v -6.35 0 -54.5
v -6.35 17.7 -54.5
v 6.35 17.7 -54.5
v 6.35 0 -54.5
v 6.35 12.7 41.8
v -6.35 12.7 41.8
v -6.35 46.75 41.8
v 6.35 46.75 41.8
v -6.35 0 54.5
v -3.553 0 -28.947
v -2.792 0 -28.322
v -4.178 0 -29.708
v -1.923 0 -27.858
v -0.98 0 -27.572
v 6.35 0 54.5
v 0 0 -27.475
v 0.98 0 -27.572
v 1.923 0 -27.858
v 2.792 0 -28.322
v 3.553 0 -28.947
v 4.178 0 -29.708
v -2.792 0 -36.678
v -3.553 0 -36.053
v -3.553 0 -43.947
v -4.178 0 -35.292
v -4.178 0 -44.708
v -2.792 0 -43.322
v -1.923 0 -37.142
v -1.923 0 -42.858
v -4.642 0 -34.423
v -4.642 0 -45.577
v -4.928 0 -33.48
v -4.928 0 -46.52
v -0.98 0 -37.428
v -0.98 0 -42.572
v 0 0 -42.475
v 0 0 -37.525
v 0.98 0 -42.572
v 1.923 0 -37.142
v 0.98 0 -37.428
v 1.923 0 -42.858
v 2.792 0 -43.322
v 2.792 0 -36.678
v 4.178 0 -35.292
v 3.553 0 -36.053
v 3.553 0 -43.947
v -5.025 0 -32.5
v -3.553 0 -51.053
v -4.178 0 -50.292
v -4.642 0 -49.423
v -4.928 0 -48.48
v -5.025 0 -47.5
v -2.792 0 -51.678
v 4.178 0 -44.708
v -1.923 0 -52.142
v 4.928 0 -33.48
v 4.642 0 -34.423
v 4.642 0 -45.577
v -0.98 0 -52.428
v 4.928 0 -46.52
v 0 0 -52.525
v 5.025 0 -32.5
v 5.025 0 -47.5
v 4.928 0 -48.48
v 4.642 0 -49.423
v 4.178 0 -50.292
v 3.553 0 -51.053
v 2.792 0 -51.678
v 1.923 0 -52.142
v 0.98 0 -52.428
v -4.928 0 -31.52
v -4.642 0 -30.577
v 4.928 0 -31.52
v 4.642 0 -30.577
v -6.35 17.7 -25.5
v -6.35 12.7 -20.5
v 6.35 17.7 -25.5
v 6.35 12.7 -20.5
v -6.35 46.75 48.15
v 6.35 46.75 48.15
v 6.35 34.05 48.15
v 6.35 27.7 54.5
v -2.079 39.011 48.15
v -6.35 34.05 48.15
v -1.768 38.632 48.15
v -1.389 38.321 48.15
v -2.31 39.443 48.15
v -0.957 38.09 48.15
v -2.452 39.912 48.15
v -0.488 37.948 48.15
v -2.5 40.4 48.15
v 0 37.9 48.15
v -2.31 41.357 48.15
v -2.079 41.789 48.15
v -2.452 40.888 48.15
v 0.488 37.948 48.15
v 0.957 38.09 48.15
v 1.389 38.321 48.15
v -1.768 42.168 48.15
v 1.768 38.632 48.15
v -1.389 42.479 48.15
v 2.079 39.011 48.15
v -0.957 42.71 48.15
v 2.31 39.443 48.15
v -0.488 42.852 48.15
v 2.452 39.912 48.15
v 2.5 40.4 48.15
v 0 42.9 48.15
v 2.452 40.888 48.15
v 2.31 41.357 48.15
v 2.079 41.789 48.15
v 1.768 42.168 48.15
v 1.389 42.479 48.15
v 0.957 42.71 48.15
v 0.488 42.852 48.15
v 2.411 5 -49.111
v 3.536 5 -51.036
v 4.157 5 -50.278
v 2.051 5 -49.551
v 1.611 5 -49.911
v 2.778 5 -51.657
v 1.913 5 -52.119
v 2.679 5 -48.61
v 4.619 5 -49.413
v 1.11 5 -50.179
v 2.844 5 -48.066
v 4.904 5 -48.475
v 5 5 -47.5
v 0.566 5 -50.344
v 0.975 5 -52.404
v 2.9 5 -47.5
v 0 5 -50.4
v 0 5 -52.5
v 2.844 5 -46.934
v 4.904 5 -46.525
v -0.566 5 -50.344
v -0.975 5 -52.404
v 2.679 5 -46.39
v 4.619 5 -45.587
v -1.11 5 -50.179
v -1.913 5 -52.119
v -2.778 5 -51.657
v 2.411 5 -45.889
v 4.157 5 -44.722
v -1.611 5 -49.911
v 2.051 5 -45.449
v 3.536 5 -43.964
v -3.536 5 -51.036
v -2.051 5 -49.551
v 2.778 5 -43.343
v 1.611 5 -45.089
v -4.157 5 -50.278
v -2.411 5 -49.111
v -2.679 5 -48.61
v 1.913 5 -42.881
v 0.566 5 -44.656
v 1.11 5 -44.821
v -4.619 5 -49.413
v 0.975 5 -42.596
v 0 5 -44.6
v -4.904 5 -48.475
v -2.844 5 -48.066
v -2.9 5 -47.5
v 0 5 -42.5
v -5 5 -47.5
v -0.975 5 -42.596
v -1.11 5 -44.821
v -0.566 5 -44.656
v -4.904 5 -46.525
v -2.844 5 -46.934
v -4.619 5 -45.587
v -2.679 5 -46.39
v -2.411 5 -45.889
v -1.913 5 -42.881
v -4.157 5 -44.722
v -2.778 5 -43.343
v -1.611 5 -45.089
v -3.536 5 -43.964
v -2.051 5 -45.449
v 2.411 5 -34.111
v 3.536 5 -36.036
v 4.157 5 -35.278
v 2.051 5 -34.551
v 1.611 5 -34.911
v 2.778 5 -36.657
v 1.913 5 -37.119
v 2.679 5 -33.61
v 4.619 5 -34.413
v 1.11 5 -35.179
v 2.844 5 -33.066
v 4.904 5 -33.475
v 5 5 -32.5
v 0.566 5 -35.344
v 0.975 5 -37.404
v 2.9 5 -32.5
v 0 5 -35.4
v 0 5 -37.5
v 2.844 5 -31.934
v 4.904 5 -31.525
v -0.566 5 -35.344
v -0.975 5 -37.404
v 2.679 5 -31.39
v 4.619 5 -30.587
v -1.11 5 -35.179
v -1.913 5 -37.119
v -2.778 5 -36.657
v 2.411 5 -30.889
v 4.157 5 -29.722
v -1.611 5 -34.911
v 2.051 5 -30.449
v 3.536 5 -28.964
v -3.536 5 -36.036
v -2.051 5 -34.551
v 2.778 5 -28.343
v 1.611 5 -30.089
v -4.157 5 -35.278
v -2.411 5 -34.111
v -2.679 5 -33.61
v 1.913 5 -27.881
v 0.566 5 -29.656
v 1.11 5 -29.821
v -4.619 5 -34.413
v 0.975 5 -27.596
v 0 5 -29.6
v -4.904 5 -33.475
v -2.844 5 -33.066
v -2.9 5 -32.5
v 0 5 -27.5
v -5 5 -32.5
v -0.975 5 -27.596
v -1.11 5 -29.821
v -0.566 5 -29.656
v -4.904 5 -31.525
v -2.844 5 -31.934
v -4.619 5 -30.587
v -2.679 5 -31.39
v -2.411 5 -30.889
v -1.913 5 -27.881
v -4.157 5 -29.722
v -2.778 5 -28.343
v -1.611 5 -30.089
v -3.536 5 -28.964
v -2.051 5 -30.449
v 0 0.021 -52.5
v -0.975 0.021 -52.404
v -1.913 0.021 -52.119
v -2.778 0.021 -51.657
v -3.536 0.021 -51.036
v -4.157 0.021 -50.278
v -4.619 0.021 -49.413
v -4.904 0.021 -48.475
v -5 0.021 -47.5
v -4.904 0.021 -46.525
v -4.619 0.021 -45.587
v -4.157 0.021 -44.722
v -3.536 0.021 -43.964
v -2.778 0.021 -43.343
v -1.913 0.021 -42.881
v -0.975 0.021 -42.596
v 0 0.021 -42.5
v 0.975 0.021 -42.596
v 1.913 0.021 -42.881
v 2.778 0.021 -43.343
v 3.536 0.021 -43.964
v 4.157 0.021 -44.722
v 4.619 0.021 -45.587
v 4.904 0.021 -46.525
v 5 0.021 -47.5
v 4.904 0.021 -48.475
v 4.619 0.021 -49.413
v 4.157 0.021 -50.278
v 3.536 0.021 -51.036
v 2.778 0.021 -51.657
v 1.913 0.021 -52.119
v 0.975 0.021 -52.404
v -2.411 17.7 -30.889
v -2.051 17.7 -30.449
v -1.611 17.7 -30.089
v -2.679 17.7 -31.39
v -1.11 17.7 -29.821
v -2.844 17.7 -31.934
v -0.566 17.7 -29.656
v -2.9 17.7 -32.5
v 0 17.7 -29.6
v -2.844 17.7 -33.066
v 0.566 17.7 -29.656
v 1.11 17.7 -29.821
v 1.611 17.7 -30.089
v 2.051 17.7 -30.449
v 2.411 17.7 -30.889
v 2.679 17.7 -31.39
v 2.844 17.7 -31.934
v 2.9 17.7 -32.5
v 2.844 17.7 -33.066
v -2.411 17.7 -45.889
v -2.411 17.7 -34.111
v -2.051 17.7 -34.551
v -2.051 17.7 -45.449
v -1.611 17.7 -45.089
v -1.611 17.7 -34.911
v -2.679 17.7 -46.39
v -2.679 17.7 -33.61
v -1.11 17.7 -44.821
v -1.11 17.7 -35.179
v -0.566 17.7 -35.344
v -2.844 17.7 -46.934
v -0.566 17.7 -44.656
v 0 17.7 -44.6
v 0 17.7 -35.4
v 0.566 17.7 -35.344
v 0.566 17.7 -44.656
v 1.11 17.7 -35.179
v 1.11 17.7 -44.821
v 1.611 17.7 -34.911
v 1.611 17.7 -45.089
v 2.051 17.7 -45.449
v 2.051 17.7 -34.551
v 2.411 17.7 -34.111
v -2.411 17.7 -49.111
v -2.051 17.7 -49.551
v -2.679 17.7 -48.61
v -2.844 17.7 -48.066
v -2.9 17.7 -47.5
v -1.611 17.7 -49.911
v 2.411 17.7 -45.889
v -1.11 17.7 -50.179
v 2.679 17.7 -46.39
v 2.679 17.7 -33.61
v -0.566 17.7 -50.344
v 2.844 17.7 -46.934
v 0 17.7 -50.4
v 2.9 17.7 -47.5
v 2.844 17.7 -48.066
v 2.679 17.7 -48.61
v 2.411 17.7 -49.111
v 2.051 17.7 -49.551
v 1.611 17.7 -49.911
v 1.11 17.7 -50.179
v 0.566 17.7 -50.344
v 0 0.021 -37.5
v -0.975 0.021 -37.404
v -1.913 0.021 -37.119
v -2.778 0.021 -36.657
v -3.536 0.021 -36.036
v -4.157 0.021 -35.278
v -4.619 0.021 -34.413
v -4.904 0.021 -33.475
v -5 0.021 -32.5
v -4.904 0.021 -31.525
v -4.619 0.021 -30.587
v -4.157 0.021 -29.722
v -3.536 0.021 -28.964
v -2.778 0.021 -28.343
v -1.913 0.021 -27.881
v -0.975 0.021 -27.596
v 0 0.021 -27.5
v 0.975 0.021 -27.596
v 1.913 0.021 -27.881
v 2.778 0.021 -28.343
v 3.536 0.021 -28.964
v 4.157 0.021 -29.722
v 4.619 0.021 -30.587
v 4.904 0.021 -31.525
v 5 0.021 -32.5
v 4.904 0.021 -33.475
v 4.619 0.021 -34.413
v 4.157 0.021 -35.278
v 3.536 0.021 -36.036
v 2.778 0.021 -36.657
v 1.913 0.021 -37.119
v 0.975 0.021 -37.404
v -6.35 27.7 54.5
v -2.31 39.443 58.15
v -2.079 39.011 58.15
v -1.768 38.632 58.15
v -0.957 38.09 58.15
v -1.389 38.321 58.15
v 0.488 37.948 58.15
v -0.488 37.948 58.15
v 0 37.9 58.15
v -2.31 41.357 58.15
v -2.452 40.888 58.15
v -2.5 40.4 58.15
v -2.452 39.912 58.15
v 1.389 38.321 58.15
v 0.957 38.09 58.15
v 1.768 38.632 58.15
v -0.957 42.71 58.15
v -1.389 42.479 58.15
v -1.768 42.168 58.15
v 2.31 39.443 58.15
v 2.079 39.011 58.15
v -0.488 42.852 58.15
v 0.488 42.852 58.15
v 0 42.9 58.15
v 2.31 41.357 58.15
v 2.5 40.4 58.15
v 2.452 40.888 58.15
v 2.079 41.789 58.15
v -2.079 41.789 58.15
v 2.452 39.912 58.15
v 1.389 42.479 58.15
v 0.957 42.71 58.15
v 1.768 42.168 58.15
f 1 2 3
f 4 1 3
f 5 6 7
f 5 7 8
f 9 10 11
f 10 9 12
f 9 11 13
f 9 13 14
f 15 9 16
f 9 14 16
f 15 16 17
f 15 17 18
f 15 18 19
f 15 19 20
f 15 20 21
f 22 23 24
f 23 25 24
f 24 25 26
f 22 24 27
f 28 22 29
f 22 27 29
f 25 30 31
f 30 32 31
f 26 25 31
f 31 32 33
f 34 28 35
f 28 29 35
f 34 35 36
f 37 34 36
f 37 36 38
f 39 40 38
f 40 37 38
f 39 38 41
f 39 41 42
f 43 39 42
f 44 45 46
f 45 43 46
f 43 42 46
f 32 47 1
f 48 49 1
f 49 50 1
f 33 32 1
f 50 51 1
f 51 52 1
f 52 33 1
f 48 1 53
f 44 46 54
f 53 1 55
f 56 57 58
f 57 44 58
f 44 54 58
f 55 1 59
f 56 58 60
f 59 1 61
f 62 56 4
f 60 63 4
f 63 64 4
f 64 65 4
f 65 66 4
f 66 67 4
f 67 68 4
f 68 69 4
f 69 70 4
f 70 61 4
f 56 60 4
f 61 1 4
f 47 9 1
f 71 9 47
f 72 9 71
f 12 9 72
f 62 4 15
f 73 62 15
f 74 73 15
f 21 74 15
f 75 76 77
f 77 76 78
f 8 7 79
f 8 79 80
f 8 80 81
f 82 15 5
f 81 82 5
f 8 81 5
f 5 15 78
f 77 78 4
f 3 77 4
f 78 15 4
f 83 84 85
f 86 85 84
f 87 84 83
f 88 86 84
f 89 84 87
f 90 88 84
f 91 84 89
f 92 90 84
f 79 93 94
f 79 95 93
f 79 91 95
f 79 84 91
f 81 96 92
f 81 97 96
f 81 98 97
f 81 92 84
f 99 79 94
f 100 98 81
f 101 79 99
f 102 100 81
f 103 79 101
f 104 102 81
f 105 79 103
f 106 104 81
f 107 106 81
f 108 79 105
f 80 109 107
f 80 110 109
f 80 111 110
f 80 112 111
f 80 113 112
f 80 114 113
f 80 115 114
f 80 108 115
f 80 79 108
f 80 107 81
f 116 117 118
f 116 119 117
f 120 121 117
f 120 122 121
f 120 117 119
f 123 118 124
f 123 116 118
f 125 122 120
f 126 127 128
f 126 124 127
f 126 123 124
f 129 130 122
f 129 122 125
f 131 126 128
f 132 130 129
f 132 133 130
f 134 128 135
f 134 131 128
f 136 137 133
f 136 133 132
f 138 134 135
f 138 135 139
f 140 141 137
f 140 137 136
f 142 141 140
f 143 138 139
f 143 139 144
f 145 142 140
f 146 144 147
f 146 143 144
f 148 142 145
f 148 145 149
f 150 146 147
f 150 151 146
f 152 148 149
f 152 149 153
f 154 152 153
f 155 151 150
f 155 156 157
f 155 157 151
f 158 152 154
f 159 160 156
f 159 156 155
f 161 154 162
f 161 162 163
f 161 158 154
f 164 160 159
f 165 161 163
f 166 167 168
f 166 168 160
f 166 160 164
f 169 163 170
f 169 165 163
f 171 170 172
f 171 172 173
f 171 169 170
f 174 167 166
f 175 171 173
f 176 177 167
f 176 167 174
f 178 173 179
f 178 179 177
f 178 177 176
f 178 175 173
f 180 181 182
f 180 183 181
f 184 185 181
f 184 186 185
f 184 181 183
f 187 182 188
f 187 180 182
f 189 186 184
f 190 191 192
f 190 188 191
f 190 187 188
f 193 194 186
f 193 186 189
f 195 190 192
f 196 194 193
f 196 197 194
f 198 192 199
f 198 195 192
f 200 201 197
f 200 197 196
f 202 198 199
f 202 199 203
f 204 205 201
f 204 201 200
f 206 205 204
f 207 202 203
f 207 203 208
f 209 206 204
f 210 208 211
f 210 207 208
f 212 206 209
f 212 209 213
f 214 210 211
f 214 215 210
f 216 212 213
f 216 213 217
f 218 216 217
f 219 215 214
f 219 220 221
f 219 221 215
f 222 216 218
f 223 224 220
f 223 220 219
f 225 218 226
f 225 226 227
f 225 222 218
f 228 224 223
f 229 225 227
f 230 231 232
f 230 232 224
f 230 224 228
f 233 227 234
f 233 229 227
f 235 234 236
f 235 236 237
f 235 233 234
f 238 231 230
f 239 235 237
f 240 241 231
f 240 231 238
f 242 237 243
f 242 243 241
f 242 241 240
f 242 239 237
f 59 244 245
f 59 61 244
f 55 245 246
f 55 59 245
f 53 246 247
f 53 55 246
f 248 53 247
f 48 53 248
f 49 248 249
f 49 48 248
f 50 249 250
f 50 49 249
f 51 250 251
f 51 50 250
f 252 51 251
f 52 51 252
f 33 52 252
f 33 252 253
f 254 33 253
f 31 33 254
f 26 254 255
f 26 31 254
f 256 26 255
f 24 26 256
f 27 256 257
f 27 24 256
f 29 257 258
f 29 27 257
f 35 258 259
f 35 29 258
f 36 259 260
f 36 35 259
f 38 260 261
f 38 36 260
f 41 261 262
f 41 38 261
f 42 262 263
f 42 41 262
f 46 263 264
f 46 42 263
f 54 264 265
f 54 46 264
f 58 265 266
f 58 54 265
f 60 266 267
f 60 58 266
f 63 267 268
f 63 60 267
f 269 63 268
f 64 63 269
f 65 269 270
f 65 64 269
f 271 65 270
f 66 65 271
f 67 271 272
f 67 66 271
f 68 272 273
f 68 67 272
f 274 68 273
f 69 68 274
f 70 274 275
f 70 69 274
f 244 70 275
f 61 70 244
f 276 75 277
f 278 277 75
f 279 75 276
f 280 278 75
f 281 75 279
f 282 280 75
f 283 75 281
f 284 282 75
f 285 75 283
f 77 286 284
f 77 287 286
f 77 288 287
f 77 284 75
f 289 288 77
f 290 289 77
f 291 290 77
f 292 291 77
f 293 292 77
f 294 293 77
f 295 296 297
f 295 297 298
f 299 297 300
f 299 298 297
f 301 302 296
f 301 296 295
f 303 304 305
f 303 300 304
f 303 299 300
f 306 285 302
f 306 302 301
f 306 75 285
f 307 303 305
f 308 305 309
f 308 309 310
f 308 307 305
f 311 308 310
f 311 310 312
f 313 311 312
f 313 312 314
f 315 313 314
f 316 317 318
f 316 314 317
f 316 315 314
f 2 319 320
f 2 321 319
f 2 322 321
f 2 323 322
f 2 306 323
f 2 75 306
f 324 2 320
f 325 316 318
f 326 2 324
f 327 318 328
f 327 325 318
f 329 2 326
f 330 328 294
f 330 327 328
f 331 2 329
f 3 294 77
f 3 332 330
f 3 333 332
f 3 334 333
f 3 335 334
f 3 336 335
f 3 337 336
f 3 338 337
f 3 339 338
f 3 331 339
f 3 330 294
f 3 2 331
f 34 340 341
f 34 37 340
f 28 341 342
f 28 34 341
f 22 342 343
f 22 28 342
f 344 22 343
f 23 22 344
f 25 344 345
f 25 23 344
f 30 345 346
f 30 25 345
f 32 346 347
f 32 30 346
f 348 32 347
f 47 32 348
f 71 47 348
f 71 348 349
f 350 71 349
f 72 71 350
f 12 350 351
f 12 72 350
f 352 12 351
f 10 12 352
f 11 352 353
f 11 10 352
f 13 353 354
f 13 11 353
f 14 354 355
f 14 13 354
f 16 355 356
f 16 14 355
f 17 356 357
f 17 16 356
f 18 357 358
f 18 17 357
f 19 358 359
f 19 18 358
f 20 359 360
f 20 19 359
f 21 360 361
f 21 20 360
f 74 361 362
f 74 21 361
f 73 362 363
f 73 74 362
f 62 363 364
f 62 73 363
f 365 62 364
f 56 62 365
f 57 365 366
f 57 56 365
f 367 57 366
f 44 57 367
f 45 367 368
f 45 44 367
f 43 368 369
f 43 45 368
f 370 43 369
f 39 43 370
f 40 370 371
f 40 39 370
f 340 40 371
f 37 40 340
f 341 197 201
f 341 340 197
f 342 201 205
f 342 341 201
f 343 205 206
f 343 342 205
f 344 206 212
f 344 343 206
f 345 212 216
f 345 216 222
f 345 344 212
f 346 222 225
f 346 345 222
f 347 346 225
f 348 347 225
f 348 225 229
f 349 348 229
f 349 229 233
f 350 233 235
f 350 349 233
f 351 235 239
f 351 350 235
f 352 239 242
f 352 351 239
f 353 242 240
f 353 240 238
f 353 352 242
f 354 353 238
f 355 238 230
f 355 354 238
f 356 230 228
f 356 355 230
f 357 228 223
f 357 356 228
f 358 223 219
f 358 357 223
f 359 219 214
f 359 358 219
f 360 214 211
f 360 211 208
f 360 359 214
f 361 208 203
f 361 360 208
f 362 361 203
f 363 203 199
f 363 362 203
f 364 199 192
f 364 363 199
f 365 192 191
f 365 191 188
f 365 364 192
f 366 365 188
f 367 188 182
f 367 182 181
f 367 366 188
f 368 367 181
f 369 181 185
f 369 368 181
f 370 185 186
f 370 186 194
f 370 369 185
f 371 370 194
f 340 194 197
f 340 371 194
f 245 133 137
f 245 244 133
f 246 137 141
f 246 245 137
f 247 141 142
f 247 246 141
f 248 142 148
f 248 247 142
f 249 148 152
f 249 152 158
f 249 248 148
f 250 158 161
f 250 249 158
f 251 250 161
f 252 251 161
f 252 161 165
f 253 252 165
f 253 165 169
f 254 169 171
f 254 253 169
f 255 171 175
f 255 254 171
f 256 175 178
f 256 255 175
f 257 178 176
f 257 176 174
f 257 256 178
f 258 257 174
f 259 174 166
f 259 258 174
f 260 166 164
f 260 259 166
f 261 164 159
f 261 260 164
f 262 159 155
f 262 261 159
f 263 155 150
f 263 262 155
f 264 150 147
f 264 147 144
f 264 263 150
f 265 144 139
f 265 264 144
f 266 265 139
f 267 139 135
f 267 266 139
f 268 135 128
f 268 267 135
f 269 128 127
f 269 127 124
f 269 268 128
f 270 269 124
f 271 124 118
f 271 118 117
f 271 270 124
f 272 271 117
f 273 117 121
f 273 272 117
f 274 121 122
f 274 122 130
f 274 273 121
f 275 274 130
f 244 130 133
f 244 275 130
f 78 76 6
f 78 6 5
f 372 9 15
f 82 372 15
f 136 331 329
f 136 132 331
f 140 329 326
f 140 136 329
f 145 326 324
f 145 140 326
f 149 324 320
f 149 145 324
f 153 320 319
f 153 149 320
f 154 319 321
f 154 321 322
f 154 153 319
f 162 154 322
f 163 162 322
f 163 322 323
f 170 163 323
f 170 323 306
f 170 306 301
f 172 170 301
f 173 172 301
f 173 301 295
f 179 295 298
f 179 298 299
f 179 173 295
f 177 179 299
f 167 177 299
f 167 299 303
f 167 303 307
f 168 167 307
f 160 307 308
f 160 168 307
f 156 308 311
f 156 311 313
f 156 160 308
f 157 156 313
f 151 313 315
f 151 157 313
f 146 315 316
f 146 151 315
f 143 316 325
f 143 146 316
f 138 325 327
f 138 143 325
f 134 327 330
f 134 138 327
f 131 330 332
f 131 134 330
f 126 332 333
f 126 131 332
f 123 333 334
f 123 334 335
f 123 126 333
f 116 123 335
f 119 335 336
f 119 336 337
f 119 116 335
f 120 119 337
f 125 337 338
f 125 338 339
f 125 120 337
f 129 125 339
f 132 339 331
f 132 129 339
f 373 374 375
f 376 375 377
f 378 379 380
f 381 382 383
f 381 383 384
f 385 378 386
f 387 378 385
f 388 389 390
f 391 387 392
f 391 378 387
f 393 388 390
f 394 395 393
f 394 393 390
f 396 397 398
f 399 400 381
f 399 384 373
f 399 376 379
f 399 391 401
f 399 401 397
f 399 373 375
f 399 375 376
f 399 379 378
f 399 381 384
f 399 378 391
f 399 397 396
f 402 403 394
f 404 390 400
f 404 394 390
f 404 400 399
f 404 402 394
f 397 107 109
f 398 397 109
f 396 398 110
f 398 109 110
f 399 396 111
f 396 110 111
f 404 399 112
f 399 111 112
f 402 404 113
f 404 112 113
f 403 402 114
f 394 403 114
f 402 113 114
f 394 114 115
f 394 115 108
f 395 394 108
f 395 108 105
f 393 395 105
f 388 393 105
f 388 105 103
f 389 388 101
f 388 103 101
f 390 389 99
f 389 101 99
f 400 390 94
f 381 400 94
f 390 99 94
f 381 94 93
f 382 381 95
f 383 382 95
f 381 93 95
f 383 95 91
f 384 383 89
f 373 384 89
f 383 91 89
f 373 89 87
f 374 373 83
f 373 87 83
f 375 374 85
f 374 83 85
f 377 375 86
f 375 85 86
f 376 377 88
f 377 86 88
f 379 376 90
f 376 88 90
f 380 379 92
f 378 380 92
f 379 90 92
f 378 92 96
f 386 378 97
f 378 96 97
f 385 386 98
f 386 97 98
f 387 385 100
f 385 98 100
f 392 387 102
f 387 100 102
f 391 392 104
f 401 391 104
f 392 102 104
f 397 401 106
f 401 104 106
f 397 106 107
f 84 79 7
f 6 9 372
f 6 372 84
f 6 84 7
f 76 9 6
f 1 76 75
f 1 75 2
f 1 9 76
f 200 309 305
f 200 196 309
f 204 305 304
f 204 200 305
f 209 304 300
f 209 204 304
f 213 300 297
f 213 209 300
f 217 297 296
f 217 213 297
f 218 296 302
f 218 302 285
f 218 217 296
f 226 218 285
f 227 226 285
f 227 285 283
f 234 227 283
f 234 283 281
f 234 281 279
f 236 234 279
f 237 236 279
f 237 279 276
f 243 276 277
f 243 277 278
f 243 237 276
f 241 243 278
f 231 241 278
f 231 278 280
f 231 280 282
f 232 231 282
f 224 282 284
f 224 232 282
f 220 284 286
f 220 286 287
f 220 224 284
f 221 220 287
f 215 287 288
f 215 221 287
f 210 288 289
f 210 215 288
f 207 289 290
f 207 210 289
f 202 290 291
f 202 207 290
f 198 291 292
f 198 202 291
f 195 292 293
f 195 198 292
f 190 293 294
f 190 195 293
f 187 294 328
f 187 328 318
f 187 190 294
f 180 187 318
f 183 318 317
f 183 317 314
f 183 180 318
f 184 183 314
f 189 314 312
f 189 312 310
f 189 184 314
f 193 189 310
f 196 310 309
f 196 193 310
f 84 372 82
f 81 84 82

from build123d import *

# Parameters (mm, degrees)
SKETCH2_W                     = 12.7
SKETCH2_H                     = 109
BOSS_EXTRUDE1_DEPTH           = 12.7
SKETCH5_W                     = 12.7
SKETCH5_H                     = 29
BOSS_EXTRUDE2_DEPTH           = 5
CBORE_FOR_M5_SHCS1_AT_2_COUNT = 2
CBORE_FOR_M5_SHCS1_AT_2_PITCH = 15
CHAMFER1_SIZE                 = 5
SKETCH7_W                     = 12.7
SKETCH7_H                     = 12.7
BOSS_EXTRUDE4_DEPTH           = 34.05
SKETCH9_W                     = 12.7
SKETCH9_H                     = 12.7
CUT_EXTRUDE2_DEPTH            = 6.35
SKETCH6_R                     = 2.5
BOSS_EXTRUDE7_DEPTH           = 10
CHAMFER3_SIZE                 = 6.35


with BuildPart() as part:
    # Sketch2 → Boss-Extrude1 (new body)
    with BuildSketch(Plane(origin=(0, 0, 0), x_dir=(1, 0, 0), z_dir=(0, 1, 0))):
        Rectangle(SKETCH2_W, SKETCH2_H)
    extrude(amount=BOSS_EXTRUDE1_DEPTH)

    # Sketch5 → Boss-Extrude2 (add)
    with BuildSketch(Plane(origin=(0, 12.7, 0), x_dir=(1, 0, 0), z_dir=(0, 1, 0))):
        with Locations((0, 40)):
            Rectangle(SKETCH5_W, SKETCH5_H)
    extrude(amount=BOSS_EXTRUDE2_DEPTH)

    # Sketch4 → CBORE for M5 SHCS1 (revolve, cut)
    with BuildSketch(Plane(origin=(0, 0, -47.5), x_dir=(0, 0, -1), z_dir=(1, 0, 0))):
        Polygon((0, 0), (0, 17.7), (2.9, 17.7), (2.9, 5), (5, 5), (5, 0.020977491), (5.025, 0), align=None)
    cbore_for_m5_shcs1 = revolve(axis=Axis((0, -6.35, -47.5), (0, 1, 0)), mode=Mode.SUBTRACT)

    # CBORE for M5 SHCS1 at 2: CBORE for M5 SHCS1 ×2
    with Locations(*[(0, 0, i * CBORE_FOR_M5_SHCS1_AT_2_PITCH) for i in range(1, CBORE_FOR_M5_SHCS1_AT_2_COUNT)]):
        add(cbore_for_m5_shcs1, mode=Mode.SUBTRACT)

    # Chamfer1
    chamfer1_edges = [part.edges().sort_by_distance(p)[0] for p in [
        (0, 12.7, -25.5),
    ]]
    chamfer(chamfer1_edges, length=CHAMFER1_SIZE - 0.0001)  # a hair under: the kernel refuses the full size

    # Sketch7 → Boss-Extrude4 (add)
    with BuildSketch(Plane(origin=(0, 12.7, 0), x_dir=(1, 0, 0), z_dir=(0, 1, 0))):
        with Locations((0, -48.15)):
            Rectangle(SKETCH7_W, SKETCH7_H)
    extrude(amount=BOSS_EXTRUDE4_DEPTH)

    # Sketch9 → Cut-Extrude2 (cut)
    with BuildSketch(Plane.XY.offset(54.5)):
        with Locations((0, 40.4)):
            Rectangle(SKETCH9_W, SKETCH9_H)
    extrude(amount=-CUT_EXTRUDE2_DEPTH, mode=Mode.SUBTRACT)

    # Sketch6 → Boss-Extrude7 (add)
    with BuildSketch(Plane.XY.offset(48.15)):
        with Locations((0, 40.4)):
            Circle(SKETCH6_R)
    extrude(amount=BOSS_EXTRUDE7_DEPTH)

    # Chamfer3
    chamfer3_edges = [part.edges().sort_by_distance(p)[0] for p in [
        (0, 34.05, 54.5),
    ]]
    chamfer(chamfer3_edges, length=CHAMFER3_SIZE - 0.0001)  # a hair under: the kernel refuses the full size


solid = part.part
